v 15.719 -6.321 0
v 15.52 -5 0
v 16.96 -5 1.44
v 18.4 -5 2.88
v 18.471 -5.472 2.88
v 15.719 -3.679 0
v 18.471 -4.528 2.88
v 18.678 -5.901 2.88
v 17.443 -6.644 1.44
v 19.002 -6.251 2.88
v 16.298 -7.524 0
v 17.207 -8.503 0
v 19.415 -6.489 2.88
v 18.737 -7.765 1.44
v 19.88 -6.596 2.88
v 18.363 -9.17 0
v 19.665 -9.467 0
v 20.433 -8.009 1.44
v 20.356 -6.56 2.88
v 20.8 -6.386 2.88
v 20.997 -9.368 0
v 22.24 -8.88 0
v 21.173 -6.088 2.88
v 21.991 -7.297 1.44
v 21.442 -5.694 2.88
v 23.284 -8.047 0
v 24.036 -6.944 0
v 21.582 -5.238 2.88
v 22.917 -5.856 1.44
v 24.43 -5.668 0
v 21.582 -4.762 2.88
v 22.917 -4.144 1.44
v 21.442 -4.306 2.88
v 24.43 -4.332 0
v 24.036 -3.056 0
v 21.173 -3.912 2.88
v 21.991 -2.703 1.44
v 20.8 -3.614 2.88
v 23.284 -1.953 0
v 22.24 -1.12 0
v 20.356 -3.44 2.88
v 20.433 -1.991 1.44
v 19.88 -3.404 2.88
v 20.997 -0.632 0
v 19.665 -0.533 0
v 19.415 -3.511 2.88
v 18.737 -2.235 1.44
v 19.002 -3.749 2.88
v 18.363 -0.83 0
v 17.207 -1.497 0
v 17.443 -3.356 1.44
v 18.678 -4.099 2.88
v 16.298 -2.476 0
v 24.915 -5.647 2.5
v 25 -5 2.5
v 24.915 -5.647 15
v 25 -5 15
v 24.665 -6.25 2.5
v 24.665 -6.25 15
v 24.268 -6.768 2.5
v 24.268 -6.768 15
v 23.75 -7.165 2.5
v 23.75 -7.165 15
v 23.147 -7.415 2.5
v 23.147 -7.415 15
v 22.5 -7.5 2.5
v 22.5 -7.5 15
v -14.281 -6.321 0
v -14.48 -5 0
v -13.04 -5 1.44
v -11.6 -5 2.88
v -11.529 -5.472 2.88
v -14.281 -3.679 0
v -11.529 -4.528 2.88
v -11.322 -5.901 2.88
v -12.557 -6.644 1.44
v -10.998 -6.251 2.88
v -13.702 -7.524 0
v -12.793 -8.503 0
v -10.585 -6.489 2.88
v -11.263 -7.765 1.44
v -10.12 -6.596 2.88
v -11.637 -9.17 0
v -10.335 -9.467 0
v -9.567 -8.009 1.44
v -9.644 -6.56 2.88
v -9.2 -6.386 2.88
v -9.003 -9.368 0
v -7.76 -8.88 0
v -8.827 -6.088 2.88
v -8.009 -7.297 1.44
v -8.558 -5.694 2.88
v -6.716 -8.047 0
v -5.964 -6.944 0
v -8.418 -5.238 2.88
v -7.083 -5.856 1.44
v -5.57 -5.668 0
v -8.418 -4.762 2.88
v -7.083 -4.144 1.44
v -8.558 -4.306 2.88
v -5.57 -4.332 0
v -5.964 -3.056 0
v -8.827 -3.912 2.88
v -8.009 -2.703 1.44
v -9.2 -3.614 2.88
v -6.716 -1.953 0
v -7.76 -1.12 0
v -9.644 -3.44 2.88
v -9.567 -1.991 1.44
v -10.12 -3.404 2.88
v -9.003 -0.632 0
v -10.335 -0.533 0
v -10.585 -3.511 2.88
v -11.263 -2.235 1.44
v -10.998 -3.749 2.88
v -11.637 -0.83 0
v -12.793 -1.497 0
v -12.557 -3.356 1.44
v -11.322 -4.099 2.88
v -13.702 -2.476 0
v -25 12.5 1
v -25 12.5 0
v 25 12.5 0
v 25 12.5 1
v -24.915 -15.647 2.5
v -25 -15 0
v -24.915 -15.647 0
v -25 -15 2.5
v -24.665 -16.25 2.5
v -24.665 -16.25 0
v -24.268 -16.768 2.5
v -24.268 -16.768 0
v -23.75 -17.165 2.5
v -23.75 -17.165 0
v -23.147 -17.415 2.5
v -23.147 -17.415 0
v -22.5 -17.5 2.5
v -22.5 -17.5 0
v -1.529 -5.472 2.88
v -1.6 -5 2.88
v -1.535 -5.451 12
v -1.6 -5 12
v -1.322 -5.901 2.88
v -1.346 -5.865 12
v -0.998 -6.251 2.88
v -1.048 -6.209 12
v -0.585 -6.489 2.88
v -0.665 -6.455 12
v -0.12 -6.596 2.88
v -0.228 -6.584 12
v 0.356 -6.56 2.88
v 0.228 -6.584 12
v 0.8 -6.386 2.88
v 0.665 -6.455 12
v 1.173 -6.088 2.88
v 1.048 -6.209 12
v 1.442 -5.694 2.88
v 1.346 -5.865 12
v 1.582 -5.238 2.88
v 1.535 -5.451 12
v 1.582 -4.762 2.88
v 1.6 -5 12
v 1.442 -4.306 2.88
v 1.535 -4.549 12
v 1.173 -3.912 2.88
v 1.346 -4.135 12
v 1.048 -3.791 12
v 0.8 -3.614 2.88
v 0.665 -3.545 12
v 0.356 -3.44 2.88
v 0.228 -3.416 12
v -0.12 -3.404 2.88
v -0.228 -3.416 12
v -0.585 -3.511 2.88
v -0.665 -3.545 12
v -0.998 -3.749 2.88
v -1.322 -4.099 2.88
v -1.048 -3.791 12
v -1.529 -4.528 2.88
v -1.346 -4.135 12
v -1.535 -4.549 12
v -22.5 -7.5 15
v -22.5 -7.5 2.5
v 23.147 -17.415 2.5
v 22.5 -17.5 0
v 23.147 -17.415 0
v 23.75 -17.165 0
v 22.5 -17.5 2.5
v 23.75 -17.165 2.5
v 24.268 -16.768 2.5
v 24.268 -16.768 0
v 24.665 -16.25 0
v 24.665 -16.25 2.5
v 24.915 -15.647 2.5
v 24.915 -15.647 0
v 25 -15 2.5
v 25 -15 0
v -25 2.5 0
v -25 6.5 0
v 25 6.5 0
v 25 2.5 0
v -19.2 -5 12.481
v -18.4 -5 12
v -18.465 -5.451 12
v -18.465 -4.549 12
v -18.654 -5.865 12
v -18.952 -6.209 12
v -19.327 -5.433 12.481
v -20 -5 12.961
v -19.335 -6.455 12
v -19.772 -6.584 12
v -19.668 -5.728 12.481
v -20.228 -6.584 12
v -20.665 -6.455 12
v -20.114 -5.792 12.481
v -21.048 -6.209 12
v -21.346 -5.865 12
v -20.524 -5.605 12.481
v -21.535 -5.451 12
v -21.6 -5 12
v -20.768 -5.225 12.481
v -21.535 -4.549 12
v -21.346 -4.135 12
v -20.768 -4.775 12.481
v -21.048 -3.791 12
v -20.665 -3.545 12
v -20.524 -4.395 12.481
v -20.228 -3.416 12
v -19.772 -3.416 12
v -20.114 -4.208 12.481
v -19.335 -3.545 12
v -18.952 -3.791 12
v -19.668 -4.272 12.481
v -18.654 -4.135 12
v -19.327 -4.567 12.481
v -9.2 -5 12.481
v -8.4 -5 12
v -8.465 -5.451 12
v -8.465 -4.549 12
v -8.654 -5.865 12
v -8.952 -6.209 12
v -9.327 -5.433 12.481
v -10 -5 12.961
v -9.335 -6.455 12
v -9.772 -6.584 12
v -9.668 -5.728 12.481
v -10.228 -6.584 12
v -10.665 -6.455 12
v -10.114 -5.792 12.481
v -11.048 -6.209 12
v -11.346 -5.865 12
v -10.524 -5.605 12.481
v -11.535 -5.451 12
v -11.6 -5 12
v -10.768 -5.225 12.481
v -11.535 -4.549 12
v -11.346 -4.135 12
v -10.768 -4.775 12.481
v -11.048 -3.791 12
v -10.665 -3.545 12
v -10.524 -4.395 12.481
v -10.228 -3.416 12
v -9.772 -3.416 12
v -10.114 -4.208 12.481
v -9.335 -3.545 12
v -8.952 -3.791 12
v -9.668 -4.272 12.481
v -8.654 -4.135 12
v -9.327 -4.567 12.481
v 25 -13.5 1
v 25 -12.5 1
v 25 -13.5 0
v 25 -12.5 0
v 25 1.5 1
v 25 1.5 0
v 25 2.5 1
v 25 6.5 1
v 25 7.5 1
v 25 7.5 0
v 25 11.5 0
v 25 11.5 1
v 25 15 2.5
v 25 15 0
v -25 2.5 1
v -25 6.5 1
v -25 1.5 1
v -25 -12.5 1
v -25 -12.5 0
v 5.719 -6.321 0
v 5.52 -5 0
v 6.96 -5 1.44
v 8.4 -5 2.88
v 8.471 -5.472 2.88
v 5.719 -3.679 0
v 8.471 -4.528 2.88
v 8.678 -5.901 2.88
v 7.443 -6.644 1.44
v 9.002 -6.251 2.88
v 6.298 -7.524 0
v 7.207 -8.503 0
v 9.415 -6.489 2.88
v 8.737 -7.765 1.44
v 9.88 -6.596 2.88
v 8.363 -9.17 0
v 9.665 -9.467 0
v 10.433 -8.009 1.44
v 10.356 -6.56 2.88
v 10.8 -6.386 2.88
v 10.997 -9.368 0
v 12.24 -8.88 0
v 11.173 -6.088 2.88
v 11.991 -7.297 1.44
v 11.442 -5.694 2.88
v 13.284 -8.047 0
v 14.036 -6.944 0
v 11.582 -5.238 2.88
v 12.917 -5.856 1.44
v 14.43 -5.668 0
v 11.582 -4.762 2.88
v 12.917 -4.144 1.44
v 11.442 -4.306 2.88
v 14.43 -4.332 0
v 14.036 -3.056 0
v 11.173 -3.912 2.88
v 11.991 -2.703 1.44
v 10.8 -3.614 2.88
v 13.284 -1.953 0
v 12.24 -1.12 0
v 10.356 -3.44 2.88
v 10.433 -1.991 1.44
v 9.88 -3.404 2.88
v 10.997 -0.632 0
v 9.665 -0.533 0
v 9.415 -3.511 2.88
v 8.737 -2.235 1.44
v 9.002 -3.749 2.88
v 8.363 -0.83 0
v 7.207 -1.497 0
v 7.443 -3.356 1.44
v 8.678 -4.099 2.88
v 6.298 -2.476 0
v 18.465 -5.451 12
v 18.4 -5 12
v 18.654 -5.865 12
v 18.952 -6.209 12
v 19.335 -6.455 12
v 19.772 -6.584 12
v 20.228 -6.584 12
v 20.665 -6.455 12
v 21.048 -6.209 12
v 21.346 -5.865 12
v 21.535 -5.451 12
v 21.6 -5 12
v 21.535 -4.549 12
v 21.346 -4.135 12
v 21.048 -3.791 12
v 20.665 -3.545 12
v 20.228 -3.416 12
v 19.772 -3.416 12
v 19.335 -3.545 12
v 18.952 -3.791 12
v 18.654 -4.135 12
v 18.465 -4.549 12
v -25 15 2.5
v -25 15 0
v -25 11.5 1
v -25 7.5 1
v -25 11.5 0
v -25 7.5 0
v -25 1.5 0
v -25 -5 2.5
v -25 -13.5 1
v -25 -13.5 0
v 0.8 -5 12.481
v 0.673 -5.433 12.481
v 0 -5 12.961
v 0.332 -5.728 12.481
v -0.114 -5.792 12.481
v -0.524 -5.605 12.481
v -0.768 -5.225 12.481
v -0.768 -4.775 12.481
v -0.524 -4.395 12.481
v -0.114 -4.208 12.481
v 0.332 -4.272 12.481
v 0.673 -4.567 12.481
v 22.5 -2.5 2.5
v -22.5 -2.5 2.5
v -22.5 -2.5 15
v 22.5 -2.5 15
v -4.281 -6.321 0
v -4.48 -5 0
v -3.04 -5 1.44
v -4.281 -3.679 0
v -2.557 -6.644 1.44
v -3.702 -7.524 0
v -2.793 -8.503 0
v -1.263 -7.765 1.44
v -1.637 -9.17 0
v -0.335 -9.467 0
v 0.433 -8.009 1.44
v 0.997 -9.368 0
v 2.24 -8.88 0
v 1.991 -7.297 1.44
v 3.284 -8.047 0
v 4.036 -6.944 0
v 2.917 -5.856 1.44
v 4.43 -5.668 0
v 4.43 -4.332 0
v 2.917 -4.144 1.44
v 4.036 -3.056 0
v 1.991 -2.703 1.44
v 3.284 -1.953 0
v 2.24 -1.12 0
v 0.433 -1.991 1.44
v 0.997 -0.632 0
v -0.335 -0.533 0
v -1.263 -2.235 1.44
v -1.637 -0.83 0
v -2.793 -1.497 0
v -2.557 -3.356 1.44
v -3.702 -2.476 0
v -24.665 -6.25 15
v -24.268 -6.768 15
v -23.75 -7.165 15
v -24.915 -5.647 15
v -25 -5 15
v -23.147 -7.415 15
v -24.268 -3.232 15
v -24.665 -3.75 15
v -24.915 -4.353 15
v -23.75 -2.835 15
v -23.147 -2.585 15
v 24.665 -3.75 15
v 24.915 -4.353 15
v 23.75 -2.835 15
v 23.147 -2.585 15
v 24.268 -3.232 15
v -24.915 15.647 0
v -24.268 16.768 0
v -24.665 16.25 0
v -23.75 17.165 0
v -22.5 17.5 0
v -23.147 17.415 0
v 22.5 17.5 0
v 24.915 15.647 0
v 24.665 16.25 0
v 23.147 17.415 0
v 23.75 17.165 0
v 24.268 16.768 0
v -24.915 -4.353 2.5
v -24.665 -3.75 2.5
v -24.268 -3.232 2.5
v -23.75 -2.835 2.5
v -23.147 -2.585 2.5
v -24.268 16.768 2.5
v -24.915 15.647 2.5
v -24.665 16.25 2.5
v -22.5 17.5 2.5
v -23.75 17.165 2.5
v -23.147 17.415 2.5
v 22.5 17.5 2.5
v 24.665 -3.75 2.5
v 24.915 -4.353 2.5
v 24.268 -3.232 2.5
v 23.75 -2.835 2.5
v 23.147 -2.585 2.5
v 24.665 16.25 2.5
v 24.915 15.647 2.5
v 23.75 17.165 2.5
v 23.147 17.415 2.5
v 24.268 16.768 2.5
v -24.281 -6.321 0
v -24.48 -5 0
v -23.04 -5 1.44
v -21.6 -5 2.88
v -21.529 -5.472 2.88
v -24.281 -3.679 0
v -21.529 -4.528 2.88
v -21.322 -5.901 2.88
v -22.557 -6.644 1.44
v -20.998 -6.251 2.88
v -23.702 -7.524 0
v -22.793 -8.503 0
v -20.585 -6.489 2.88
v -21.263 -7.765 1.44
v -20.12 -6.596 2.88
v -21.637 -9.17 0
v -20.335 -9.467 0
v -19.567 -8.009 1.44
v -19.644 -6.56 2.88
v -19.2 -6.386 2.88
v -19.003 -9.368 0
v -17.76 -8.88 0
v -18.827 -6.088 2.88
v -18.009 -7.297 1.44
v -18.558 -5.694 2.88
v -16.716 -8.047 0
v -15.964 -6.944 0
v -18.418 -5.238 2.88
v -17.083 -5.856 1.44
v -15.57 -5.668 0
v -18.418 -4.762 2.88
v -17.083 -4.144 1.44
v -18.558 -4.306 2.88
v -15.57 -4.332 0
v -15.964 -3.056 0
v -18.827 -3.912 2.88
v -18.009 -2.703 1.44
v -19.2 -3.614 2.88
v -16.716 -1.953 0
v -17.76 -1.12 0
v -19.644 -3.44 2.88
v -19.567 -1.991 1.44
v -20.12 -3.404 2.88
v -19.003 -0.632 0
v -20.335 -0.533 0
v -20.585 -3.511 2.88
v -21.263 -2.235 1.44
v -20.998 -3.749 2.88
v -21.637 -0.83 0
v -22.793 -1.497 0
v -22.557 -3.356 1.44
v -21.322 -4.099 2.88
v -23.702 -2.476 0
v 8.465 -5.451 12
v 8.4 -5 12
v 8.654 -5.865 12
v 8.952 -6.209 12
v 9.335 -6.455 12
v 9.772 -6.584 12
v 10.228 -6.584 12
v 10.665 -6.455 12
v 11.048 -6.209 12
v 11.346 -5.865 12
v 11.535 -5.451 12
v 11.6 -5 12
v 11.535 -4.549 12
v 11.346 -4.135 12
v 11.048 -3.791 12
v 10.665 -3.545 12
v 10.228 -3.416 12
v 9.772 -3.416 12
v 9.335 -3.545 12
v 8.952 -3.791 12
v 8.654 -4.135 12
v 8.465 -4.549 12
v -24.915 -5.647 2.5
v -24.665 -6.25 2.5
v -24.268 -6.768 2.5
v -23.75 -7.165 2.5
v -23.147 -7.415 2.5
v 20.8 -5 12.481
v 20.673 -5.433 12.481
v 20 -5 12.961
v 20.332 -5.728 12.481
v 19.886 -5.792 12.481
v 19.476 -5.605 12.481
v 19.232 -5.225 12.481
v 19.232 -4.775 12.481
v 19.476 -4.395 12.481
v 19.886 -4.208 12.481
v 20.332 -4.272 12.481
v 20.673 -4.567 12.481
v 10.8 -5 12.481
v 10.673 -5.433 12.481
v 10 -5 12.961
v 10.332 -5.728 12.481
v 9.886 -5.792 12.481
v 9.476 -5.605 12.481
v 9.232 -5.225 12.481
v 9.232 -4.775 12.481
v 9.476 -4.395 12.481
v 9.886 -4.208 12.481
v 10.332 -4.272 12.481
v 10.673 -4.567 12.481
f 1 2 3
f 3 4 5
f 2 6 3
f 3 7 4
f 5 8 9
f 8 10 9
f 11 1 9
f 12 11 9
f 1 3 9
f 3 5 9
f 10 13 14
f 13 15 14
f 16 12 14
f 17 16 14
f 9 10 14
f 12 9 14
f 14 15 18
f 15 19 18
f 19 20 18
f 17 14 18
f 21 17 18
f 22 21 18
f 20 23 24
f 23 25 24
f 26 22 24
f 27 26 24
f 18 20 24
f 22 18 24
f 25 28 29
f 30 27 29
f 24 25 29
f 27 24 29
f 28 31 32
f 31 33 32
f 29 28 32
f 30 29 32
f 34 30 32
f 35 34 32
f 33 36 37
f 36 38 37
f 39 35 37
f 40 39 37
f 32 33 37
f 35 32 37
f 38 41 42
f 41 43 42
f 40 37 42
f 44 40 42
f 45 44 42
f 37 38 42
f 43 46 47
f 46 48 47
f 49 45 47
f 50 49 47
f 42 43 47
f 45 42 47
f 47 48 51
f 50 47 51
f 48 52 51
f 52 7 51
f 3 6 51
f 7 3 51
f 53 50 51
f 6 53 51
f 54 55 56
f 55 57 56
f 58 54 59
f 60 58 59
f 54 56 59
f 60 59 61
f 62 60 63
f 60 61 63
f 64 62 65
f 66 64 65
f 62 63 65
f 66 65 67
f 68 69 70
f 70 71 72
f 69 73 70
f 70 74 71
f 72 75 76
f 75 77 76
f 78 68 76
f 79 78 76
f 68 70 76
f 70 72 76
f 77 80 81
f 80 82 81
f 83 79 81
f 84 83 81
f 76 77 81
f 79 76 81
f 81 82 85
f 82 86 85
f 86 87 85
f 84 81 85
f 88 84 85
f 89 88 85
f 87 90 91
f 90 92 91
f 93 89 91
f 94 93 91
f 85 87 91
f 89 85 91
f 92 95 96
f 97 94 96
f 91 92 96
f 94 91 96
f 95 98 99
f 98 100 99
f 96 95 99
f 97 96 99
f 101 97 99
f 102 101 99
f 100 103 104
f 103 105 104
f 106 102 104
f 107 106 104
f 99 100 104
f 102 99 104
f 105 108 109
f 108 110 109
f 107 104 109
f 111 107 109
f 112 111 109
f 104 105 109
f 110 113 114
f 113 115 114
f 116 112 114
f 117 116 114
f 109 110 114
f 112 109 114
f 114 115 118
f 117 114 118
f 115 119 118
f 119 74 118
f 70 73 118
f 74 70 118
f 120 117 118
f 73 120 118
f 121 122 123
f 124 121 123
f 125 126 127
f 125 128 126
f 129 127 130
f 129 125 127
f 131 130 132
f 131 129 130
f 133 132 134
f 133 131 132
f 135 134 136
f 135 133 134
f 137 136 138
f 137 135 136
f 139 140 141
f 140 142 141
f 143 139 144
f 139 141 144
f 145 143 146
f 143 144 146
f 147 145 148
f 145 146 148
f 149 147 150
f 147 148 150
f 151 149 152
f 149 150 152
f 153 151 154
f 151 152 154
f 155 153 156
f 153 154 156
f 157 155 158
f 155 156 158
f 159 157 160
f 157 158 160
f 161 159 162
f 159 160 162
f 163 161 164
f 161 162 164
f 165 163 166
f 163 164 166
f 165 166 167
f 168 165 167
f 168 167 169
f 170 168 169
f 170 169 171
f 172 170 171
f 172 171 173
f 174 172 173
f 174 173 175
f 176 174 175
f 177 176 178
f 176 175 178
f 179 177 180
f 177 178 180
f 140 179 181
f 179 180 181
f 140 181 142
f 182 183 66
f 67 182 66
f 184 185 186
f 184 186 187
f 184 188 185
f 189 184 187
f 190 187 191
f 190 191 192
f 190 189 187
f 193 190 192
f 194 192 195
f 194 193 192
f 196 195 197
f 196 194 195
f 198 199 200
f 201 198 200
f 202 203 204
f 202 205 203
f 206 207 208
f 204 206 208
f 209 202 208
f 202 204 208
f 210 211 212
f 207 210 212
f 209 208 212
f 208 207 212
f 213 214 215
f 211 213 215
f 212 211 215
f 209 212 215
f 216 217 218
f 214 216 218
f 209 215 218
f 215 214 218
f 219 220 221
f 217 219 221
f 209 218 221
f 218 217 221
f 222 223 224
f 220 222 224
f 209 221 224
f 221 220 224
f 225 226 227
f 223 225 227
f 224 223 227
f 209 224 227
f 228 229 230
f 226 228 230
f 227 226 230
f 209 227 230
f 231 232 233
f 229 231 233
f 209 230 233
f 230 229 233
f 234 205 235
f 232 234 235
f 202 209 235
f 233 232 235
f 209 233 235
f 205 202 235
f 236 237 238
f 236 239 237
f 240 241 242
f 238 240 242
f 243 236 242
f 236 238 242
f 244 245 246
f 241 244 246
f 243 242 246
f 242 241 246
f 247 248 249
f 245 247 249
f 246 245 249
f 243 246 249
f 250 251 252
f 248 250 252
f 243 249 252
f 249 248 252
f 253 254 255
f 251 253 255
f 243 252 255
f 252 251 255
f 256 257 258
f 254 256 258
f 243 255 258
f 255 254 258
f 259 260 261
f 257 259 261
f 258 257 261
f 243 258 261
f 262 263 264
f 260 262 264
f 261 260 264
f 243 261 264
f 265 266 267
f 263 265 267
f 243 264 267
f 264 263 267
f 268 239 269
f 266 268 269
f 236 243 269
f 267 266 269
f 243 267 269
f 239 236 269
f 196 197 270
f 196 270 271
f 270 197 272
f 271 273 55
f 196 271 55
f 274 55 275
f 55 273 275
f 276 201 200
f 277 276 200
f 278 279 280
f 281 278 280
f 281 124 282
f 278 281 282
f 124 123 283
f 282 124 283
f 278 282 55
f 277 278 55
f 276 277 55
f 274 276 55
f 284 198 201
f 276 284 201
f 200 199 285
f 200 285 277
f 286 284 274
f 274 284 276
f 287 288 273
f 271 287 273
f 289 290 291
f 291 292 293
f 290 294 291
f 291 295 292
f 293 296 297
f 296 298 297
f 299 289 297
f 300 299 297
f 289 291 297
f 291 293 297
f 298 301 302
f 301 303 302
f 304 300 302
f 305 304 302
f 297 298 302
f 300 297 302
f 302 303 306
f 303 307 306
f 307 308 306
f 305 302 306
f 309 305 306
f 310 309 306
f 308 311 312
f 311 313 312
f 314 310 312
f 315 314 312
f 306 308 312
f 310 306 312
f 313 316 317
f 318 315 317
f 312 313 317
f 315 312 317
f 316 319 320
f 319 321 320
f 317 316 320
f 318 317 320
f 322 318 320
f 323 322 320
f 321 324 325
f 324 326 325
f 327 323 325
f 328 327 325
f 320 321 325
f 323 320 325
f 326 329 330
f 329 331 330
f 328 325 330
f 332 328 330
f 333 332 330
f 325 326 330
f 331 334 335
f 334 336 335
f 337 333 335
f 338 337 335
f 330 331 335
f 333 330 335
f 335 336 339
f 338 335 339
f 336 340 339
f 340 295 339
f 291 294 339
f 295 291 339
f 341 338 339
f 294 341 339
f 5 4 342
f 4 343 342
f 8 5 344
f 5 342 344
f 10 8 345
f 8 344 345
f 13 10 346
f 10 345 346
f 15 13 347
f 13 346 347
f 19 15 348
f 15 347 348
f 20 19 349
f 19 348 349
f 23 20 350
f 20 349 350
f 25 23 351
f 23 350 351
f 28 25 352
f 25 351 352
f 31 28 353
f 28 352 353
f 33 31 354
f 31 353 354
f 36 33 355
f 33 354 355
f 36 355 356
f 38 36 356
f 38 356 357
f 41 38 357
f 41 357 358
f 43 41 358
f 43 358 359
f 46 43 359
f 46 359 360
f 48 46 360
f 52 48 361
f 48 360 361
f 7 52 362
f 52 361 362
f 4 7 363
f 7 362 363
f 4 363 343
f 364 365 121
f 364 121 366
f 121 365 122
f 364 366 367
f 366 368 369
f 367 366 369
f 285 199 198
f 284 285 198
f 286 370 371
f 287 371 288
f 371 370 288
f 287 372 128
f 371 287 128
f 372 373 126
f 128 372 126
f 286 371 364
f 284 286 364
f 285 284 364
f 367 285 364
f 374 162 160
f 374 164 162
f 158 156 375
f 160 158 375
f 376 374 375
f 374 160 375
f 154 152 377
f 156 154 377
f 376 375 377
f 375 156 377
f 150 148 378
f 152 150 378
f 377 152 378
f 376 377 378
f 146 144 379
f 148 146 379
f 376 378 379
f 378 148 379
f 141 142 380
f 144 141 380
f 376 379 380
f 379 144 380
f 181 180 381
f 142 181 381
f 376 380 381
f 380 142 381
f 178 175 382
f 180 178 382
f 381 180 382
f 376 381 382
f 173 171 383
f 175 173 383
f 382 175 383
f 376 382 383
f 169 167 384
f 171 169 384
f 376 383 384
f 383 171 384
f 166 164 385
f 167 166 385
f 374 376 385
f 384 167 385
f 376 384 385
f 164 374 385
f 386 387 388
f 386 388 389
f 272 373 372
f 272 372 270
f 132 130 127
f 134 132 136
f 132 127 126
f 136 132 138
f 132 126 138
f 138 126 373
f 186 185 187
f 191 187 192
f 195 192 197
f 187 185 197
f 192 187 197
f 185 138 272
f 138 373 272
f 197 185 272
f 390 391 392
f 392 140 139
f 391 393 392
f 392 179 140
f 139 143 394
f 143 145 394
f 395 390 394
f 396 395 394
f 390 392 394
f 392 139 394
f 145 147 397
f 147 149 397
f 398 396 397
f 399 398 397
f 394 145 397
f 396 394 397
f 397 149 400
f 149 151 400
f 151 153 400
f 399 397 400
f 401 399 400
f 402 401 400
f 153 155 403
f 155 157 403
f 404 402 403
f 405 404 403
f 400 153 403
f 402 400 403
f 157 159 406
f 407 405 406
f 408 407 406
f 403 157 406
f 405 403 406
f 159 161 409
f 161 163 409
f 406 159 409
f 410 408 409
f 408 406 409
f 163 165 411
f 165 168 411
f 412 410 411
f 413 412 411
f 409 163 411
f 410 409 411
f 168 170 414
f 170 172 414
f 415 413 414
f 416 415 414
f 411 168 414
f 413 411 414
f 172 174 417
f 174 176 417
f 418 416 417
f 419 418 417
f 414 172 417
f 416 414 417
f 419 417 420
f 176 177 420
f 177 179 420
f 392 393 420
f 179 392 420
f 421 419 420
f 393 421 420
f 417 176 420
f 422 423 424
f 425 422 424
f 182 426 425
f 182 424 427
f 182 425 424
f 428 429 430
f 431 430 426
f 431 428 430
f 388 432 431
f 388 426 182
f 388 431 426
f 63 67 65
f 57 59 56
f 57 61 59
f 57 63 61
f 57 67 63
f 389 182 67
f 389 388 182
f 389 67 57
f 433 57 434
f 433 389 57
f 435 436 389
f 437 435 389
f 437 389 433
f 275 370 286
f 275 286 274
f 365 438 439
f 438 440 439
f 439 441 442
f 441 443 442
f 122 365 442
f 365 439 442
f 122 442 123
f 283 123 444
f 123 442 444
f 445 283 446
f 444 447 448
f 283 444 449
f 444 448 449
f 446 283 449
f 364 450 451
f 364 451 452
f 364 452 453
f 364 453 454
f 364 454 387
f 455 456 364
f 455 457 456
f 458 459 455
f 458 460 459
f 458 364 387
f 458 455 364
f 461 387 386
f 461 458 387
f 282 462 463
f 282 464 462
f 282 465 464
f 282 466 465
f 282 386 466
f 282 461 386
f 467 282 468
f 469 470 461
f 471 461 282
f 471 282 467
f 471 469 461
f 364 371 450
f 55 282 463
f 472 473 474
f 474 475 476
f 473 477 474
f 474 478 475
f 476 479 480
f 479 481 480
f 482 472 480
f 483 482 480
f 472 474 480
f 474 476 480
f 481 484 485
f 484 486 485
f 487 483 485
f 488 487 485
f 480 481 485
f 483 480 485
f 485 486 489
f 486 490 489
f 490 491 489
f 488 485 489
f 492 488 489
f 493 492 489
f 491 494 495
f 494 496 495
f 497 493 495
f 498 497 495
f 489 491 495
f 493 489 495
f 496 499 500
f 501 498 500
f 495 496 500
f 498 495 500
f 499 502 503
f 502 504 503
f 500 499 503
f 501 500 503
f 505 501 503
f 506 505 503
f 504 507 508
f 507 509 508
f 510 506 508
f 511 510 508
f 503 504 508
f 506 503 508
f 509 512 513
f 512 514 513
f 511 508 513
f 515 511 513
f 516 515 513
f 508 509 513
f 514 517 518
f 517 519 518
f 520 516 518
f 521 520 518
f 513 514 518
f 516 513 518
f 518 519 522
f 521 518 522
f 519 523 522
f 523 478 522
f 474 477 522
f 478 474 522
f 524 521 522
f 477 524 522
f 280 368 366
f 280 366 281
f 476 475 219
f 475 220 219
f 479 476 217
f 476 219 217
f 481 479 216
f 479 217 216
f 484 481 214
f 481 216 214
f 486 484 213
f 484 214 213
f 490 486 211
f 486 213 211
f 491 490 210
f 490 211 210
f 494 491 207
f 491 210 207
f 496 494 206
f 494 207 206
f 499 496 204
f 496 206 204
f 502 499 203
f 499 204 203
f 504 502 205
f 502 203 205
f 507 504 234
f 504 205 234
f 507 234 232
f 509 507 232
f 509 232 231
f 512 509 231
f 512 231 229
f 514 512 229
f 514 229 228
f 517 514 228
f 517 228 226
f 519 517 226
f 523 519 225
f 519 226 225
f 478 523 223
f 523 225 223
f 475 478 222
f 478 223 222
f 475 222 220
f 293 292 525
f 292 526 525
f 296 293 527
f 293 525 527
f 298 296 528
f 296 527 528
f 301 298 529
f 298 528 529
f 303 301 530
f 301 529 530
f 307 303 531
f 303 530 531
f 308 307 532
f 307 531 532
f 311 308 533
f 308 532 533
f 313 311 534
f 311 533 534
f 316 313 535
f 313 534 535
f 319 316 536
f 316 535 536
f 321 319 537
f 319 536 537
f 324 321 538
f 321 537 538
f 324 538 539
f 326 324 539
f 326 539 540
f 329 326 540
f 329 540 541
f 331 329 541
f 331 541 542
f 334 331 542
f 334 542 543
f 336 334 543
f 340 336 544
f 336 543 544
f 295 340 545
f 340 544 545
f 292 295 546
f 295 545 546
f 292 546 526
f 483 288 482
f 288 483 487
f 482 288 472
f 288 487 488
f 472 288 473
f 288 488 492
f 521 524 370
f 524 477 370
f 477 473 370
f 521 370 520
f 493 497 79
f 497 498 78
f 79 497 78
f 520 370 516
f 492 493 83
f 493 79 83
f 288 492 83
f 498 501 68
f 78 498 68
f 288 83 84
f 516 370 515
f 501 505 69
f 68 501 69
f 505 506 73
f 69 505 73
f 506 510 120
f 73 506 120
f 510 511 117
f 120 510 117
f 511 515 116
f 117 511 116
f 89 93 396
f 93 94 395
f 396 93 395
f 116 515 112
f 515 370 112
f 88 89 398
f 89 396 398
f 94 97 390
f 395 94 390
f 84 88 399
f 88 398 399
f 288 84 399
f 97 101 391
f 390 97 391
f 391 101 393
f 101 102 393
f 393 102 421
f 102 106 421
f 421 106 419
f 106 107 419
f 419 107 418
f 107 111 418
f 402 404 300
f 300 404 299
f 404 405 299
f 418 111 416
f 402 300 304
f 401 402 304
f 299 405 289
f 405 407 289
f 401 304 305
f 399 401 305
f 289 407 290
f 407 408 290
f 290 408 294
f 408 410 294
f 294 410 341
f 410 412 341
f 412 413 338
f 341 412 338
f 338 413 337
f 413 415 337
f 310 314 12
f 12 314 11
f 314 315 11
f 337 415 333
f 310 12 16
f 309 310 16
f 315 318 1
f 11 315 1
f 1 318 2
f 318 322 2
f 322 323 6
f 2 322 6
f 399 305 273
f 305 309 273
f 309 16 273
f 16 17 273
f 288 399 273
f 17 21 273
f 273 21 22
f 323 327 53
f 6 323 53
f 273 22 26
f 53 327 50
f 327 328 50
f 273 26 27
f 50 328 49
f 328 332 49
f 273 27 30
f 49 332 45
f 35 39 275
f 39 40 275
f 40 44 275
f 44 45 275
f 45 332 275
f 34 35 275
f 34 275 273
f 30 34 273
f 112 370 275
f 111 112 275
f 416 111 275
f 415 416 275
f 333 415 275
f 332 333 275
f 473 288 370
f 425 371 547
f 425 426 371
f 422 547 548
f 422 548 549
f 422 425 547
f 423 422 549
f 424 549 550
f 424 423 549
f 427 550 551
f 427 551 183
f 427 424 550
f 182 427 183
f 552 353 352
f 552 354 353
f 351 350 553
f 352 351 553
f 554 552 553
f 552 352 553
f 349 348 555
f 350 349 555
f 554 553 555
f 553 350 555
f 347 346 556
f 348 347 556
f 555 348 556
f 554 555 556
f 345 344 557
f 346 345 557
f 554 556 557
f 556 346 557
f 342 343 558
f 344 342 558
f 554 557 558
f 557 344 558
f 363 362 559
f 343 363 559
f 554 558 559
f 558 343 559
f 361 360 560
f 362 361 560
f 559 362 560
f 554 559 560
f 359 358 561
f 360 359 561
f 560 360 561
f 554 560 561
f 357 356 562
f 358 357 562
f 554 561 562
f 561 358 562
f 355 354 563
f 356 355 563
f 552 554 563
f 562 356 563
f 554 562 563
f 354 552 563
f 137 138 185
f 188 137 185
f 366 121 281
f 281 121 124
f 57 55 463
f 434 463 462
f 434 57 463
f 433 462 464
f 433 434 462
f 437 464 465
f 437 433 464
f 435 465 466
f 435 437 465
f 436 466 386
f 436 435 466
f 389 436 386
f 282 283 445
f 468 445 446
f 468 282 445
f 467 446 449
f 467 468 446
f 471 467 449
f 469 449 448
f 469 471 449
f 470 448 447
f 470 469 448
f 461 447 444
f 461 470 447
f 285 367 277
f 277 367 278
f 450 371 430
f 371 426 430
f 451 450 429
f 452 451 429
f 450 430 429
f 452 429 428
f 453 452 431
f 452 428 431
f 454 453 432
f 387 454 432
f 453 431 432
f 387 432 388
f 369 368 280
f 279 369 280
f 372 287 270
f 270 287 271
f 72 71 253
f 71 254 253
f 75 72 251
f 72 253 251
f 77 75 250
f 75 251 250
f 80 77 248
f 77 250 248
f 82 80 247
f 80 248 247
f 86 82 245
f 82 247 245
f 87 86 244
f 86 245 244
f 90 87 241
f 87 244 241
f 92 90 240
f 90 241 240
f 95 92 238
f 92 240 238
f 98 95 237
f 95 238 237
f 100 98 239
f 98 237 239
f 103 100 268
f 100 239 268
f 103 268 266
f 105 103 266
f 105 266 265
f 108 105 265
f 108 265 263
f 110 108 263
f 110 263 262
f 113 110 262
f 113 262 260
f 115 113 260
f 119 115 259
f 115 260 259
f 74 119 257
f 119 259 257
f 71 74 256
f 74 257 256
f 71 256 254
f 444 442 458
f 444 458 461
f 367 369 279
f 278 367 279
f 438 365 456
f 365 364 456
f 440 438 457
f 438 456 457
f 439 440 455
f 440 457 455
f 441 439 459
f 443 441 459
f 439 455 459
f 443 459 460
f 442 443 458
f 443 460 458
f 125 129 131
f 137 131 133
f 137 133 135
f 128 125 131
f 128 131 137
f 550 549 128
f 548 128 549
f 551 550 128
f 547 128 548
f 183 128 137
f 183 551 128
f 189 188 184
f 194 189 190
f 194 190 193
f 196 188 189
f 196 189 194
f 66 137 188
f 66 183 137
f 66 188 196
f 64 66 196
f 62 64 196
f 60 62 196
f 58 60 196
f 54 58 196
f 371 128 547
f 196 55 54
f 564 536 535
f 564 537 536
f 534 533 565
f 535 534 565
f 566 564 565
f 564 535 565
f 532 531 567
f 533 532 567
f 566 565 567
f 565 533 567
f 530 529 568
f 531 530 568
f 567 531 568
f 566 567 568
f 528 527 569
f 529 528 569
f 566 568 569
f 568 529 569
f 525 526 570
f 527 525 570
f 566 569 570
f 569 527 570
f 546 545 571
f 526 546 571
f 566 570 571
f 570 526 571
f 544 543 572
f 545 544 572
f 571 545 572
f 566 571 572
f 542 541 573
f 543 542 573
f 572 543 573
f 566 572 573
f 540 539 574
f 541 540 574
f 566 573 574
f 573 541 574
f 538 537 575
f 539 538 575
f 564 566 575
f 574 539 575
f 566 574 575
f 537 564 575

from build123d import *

# Parameters (mm, degrees)
F0_W           = 50
F0_H           = 5
F0_H_2         = 4
F0_H_3         = 1
F1_DEPTH       = 2.5
F2_DEPTH       = 15
F3_R           = 2.49999
F4_D           = 3.2
F4_DEPTH       = 12
F4_CSINK_D     = 8.96
F4_CSINK_ANGLE = 90
F4_TIP         = 0.9613769904
F5_DEPTH       = 1


# Not quite as in the source:
# - a fillet or chamfer is up to 0.001 mm smaller than in the source, because OpenCascade refuses the exact size


with BuildPart() as f1:
    # F0 (on Top) → F1 (new body)
    with BuildSketch(Plane.XY):
        with Locations((0, 15)):
            Rectangle(F0_W, F0_H)
        with Locations((0, -5.5)):
            Rectangle(F0_W, F0_H_2)
        with Locations((0, -15.5)):
            Rectangle(F0_W, F0_H_2)
        with Locations((0, -13)):
            Rectangle(F0_W, F0_H_3)
        with Locations((0, -10.5)):
            Rectangle(F0_W, F0_H_2)
        with Locations((0, -3)):
            Rectangle(F0_W, F0_H_3)
        with Locations((0, -0.5)):
            Rectangle(F0_W, F0_H_2)
        with Locations((0, 7)):
            Rectangle(F0_W, F0_H_3)
        with Locations((0, 9.5)):
            Rectangle(F0_W, F0_H_2)
        with Locations((0, 12)):
            Rectangle(F0_W, F0_H_3)
        with Locations((0, -8)):
            Rectangle(F0_W, F0_H_3)
        with Locations((0, 2)):
            Rectangle(F0_W, F0_H_3)
        with Locations((0, 4.5)):
            Rectangle(F0_W, F0_H_2)
    extrude(amount=F1_DEPTH)

    # F0 (on Top) → F2 (join)
    with BuildSketch(Plane.XY):
        with Locations((0, -5.5)):
            Rectangle(F0_W, F0_H_2)
        with Locations((0, -3)):
            Rectangle(F0_W, F0_H_3)
    extrude(amount=F2_DEPTH)

    # F3 (radius 2.5 in the source; OpenCascade refuses exactly that, so slightly less here)
    f3_edges = [f1.edges().sort_by_distance(p)[0] for p in [
        (-25, 17.5, 1.25),
        (25, 17.5, 1.25),
        (25, -2.5, 8.75),
        (25, -7.5, 8.75),
        (-25, -2.5, 8.75),
        (-25, -7.5, 8.75),
        (-25, -17.5, 1.25),
        (25, -17.5, 1.25),
    ]]
    fillet(f3_edges, radius=F3_R)

    # F4
    with Locations(Plane(origin=(0, 0, 0), x_dir=(1, 0, 0), z_dir=(0, 0, -1))):
        with Locations((20, 5), (10, 5), (0, 5), (-10, 5), (-20, 5)):
            CounterSinkHole(F4_D / 2, F4_CSINK_D / 2, depth=F4_DEPTH, counter_sink_angle=F4_CSINK_ANGLE)
            with Locations((0, 0, -(F4_DEPTH + F4_TIP / 2))):  # 118° drill point
                Cone(0, F4_D / 2, F4_TIP, mode=Mode.SUBTRACT)

    # F0 (on Top) → F5 (cut)
    with BuildSketch(Plane.XY):
        with Locations((0, -13)):
            Rectangle(F0_W, F0_H_3)
        with Locations((0, 2)):
            Rectangle(F0_W, F0_H_3)
        with Locations((0, 7)):
            Rectangle(F0_W, F0_H_3)
        with Locations((0, 12)):
            Rectangle(F0_W, F0_H_3)
    extrude(amount=F5_DEPTH, mode=Mode.SUBTRACT)


solid = f1.part
